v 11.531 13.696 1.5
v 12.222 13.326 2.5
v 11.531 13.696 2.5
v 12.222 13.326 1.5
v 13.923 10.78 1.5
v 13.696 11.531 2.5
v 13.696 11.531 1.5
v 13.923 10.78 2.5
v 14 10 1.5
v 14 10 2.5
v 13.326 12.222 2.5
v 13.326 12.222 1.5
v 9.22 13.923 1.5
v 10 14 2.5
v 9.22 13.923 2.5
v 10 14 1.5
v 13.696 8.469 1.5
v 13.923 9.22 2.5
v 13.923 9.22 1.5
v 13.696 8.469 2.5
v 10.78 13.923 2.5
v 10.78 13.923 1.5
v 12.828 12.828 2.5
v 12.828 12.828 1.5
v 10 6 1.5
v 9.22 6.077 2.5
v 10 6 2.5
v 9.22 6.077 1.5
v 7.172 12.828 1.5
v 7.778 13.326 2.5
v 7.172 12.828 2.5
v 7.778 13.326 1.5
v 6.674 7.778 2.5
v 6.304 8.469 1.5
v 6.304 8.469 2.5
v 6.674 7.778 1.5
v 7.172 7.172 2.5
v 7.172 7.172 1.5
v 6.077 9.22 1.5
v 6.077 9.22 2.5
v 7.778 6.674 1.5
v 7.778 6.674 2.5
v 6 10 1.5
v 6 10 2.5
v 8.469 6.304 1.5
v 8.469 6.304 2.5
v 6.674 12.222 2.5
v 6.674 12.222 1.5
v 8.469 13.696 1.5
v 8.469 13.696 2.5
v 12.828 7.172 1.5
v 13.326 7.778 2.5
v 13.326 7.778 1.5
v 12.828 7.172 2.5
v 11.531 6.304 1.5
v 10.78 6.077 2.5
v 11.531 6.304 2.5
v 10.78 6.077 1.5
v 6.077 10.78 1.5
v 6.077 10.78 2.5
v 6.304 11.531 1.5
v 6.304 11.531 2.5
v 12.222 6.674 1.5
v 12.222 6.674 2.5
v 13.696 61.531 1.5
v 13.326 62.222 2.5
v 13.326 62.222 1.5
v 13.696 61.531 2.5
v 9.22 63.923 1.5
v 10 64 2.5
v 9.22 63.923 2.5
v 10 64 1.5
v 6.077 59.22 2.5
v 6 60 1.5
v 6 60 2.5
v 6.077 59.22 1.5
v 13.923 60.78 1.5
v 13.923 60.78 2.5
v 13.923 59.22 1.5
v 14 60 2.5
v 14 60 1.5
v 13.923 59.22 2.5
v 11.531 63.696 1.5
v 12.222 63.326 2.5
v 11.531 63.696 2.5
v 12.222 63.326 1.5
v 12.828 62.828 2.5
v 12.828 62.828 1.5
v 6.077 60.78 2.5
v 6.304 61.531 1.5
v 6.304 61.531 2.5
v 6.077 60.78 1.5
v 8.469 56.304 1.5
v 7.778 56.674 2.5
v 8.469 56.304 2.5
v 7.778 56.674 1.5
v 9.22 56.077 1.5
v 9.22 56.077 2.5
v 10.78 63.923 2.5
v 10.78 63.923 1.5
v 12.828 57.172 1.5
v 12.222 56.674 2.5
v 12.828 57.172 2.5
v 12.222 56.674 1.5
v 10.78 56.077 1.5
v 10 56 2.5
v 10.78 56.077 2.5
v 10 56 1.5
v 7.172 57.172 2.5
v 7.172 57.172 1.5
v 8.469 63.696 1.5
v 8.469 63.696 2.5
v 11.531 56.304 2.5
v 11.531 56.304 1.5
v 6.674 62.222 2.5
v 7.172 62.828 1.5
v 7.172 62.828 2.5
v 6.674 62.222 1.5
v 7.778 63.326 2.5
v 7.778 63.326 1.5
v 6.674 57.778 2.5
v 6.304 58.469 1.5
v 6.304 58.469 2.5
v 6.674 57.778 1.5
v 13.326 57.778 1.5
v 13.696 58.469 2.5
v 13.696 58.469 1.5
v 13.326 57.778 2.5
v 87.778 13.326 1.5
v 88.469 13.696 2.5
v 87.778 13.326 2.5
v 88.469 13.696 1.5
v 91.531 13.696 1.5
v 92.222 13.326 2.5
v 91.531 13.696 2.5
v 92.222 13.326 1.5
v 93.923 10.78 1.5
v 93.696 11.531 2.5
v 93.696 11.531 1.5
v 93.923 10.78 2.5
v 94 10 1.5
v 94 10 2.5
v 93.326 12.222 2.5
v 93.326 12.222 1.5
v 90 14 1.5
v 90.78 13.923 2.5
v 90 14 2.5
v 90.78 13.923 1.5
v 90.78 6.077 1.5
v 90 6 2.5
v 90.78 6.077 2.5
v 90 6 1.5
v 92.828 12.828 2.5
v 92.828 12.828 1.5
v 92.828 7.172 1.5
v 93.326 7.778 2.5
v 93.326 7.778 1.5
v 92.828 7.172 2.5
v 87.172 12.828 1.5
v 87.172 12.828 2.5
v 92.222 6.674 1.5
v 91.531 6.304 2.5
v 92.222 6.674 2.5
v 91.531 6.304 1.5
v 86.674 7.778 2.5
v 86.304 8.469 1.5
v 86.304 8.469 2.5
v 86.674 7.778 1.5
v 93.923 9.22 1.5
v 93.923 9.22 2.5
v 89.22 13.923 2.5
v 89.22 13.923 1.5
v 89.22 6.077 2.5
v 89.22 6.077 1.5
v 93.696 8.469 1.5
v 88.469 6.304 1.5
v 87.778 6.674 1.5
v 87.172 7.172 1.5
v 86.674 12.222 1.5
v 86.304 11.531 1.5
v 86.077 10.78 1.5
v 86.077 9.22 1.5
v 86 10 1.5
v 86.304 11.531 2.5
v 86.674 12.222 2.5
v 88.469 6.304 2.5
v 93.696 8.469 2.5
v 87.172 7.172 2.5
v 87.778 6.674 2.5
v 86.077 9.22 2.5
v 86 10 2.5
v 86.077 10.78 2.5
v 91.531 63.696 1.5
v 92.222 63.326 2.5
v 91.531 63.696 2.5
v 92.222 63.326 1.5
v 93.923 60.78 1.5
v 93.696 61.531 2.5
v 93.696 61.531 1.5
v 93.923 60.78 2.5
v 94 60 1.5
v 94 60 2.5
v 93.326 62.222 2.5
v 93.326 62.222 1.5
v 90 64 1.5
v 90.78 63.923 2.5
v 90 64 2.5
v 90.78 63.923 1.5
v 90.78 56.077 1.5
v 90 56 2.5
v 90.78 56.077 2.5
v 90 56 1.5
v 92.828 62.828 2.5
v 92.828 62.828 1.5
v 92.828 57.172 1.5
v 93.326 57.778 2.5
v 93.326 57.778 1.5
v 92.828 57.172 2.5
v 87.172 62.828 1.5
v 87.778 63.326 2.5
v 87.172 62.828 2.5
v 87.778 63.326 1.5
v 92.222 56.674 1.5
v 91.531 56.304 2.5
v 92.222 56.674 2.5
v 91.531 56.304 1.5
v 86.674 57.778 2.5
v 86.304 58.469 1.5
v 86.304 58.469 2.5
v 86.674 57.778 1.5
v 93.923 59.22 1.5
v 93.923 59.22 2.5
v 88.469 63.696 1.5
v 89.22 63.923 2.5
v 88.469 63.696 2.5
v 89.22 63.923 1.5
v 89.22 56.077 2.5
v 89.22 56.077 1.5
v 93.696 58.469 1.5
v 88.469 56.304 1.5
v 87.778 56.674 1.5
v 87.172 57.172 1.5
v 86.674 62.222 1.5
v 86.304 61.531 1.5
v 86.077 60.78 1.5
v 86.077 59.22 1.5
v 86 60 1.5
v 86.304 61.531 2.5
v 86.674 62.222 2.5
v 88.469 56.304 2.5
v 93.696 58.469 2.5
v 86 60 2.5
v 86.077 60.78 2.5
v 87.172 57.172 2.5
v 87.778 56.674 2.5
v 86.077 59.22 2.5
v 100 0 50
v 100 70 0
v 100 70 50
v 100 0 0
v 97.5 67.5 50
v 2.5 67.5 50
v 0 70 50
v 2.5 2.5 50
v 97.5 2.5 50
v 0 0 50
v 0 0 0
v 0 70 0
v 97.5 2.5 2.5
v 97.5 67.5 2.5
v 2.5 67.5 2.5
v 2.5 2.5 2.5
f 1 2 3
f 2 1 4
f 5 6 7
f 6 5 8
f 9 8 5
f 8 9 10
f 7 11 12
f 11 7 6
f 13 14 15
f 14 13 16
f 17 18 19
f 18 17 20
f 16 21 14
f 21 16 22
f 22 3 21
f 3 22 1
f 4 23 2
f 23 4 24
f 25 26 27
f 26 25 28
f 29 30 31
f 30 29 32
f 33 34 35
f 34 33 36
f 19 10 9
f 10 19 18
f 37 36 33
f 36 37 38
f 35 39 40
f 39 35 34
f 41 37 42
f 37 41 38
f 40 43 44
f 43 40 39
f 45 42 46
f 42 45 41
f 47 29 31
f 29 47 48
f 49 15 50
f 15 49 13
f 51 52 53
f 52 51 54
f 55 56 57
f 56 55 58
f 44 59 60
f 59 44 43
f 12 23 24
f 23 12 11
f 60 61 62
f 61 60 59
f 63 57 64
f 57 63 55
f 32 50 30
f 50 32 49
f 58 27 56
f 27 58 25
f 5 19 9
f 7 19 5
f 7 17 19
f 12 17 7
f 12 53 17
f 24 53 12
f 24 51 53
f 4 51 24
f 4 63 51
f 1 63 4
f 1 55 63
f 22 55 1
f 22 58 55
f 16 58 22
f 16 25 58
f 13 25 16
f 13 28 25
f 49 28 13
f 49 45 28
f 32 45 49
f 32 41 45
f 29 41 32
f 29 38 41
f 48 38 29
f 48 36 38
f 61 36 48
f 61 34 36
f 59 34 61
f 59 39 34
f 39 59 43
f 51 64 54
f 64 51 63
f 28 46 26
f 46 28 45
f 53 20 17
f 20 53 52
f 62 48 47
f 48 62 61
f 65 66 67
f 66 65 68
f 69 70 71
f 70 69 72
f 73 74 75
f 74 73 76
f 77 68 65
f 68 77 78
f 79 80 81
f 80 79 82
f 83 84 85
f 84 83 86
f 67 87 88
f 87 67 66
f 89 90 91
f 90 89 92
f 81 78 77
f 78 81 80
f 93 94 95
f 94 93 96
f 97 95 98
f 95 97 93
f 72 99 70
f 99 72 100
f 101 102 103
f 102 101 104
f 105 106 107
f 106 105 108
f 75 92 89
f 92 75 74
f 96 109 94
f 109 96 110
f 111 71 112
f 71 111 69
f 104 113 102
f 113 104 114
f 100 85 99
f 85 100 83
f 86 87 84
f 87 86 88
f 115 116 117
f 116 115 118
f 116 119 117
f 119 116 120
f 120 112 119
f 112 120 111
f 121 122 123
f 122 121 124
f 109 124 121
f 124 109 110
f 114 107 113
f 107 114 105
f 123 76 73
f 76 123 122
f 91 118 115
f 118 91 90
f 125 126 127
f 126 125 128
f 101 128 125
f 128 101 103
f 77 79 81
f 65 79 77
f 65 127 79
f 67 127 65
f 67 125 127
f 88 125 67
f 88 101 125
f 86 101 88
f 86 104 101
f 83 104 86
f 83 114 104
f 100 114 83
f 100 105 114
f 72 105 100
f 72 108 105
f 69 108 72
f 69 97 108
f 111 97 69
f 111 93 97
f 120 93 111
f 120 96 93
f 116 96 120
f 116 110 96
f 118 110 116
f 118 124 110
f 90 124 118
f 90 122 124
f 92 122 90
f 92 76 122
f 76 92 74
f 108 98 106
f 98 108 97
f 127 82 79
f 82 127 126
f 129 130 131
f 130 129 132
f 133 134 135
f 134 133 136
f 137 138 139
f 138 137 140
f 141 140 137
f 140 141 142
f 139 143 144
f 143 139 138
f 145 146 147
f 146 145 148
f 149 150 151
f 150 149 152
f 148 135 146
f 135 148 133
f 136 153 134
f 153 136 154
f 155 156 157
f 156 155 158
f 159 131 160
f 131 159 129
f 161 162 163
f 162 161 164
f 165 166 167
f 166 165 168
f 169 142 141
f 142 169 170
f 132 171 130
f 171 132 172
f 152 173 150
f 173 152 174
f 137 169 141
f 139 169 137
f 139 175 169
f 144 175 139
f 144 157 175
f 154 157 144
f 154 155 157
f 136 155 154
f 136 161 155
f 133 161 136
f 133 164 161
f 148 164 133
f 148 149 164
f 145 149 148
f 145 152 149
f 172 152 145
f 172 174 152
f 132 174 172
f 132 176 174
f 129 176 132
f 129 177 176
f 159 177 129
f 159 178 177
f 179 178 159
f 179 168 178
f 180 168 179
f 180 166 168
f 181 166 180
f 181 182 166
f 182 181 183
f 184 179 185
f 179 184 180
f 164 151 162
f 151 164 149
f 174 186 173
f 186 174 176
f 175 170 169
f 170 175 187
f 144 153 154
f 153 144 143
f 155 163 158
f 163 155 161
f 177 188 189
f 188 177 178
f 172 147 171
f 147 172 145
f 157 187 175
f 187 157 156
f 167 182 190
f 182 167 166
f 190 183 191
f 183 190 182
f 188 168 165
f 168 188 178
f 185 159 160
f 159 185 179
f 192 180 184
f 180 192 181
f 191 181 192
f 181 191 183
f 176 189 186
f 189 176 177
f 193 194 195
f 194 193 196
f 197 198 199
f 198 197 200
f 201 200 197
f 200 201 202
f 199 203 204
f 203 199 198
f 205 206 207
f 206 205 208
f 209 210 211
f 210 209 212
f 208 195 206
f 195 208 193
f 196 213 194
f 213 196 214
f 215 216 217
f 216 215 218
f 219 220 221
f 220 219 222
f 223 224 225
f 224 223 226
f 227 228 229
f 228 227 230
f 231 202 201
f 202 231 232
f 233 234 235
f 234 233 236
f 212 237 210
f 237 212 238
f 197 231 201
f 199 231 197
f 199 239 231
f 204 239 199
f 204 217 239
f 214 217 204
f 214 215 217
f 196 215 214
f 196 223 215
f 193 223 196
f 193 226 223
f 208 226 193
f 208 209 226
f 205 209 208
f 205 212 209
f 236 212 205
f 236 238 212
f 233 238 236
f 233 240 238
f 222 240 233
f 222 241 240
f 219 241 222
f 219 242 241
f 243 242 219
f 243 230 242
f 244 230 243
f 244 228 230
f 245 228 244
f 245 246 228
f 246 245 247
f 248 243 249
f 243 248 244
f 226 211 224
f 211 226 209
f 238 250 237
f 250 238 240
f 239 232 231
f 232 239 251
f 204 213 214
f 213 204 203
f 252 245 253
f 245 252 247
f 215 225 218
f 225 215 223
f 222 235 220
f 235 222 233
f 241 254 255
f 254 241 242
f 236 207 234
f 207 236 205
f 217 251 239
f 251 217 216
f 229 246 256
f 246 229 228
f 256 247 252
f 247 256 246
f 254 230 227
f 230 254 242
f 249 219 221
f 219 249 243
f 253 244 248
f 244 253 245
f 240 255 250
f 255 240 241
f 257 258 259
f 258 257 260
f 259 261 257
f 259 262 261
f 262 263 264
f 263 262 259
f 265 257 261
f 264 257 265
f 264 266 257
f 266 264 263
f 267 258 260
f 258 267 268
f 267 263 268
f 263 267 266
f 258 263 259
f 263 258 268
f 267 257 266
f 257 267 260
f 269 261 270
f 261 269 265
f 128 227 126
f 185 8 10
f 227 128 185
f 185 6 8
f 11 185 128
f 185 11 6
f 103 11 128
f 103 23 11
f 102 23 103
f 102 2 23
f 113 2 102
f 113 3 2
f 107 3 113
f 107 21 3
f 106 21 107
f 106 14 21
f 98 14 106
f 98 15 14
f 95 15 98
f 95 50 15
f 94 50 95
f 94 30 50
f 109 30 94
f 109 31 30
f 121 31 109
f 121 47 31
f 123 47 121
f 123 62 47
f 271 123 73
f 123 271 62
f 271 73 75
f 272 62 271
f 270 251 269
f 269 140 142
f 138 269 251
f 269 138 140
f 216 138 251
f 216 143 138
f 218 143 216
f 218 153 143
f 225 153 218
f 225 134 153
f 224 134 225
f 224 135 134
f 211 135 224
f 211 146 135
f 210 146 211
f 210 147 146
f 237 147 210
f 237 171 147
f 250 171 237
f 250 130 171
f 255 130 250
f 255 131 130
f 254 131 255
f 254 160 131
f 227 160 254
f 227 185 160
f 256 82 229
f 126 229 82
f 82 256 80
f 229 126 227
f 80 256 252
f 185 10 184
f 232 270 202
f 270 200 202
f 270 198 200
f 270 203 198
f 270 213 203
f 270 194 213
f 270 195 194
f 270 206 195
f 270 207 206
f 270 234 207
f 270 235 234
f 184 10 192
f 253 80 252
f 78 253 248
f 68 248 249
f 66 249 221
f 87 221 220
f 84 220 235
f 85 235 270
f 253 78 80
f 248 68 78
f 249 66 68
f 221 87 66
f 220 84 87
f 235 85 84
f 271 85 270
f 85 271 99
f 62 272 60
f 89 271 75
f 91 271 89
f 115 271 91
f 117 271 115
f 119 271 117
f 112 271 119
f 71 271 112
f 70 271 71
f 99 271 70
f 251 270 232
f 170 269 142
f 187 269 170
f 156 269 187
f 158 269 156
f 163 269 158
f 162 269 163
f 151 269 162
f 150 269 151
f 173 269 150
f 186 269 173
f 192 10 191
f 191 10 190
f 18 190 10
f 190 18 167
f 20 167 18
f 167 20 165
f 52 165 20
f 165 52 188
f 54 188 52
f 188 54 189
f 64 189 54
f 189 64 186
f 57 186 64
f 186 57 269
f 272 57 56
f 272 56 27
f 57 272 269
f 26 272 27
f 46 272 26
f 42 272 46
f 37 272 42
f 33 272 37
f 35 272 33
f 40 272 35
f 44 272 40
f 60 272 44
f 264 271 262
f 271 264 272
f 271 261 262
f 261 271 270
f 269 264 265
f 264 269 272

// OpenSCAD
$fn = 32;

// ----------------------------------------------------------------------
// Enclosure box: bosses enclosure
// ----------------------------------------------------------------------

// --- parameters (mm) ---
box_l = 100;              // outer length, X
box_w = 70;               // outer width, Y
box_h = 50;               // outer height
wall_t = 2.5;             // wall thickness
boss_r = 4;               // corner boss radius
hole_r = 2;               // boss screw hole radius
boss_in = 10;             // boss inset from the corners

inner_h = box_h - wall_t;  // cavity depth
boss_h = inner_h - 2;  // corner boss height

difference() {
  cube([box_l, box_w, box_h]);
  translate([wall_t, wall_t, wall_t])
    cube([box_l - 2 * wall_t, box_w - 2 * wall_t, box_h]);
  for (sx = [0, 1], sy = [0, 1])
    translate([sx ? box_l - boss_in : boss_in,
               sy ? box_w - boss_in : boss_in, wall_t - 1]) {
      cylinder(r = boss_r, h = boss_h);
      translate([0, 0, boss_h - 4])
        cylinder(r = hole_r, h = 5);
    }
}
